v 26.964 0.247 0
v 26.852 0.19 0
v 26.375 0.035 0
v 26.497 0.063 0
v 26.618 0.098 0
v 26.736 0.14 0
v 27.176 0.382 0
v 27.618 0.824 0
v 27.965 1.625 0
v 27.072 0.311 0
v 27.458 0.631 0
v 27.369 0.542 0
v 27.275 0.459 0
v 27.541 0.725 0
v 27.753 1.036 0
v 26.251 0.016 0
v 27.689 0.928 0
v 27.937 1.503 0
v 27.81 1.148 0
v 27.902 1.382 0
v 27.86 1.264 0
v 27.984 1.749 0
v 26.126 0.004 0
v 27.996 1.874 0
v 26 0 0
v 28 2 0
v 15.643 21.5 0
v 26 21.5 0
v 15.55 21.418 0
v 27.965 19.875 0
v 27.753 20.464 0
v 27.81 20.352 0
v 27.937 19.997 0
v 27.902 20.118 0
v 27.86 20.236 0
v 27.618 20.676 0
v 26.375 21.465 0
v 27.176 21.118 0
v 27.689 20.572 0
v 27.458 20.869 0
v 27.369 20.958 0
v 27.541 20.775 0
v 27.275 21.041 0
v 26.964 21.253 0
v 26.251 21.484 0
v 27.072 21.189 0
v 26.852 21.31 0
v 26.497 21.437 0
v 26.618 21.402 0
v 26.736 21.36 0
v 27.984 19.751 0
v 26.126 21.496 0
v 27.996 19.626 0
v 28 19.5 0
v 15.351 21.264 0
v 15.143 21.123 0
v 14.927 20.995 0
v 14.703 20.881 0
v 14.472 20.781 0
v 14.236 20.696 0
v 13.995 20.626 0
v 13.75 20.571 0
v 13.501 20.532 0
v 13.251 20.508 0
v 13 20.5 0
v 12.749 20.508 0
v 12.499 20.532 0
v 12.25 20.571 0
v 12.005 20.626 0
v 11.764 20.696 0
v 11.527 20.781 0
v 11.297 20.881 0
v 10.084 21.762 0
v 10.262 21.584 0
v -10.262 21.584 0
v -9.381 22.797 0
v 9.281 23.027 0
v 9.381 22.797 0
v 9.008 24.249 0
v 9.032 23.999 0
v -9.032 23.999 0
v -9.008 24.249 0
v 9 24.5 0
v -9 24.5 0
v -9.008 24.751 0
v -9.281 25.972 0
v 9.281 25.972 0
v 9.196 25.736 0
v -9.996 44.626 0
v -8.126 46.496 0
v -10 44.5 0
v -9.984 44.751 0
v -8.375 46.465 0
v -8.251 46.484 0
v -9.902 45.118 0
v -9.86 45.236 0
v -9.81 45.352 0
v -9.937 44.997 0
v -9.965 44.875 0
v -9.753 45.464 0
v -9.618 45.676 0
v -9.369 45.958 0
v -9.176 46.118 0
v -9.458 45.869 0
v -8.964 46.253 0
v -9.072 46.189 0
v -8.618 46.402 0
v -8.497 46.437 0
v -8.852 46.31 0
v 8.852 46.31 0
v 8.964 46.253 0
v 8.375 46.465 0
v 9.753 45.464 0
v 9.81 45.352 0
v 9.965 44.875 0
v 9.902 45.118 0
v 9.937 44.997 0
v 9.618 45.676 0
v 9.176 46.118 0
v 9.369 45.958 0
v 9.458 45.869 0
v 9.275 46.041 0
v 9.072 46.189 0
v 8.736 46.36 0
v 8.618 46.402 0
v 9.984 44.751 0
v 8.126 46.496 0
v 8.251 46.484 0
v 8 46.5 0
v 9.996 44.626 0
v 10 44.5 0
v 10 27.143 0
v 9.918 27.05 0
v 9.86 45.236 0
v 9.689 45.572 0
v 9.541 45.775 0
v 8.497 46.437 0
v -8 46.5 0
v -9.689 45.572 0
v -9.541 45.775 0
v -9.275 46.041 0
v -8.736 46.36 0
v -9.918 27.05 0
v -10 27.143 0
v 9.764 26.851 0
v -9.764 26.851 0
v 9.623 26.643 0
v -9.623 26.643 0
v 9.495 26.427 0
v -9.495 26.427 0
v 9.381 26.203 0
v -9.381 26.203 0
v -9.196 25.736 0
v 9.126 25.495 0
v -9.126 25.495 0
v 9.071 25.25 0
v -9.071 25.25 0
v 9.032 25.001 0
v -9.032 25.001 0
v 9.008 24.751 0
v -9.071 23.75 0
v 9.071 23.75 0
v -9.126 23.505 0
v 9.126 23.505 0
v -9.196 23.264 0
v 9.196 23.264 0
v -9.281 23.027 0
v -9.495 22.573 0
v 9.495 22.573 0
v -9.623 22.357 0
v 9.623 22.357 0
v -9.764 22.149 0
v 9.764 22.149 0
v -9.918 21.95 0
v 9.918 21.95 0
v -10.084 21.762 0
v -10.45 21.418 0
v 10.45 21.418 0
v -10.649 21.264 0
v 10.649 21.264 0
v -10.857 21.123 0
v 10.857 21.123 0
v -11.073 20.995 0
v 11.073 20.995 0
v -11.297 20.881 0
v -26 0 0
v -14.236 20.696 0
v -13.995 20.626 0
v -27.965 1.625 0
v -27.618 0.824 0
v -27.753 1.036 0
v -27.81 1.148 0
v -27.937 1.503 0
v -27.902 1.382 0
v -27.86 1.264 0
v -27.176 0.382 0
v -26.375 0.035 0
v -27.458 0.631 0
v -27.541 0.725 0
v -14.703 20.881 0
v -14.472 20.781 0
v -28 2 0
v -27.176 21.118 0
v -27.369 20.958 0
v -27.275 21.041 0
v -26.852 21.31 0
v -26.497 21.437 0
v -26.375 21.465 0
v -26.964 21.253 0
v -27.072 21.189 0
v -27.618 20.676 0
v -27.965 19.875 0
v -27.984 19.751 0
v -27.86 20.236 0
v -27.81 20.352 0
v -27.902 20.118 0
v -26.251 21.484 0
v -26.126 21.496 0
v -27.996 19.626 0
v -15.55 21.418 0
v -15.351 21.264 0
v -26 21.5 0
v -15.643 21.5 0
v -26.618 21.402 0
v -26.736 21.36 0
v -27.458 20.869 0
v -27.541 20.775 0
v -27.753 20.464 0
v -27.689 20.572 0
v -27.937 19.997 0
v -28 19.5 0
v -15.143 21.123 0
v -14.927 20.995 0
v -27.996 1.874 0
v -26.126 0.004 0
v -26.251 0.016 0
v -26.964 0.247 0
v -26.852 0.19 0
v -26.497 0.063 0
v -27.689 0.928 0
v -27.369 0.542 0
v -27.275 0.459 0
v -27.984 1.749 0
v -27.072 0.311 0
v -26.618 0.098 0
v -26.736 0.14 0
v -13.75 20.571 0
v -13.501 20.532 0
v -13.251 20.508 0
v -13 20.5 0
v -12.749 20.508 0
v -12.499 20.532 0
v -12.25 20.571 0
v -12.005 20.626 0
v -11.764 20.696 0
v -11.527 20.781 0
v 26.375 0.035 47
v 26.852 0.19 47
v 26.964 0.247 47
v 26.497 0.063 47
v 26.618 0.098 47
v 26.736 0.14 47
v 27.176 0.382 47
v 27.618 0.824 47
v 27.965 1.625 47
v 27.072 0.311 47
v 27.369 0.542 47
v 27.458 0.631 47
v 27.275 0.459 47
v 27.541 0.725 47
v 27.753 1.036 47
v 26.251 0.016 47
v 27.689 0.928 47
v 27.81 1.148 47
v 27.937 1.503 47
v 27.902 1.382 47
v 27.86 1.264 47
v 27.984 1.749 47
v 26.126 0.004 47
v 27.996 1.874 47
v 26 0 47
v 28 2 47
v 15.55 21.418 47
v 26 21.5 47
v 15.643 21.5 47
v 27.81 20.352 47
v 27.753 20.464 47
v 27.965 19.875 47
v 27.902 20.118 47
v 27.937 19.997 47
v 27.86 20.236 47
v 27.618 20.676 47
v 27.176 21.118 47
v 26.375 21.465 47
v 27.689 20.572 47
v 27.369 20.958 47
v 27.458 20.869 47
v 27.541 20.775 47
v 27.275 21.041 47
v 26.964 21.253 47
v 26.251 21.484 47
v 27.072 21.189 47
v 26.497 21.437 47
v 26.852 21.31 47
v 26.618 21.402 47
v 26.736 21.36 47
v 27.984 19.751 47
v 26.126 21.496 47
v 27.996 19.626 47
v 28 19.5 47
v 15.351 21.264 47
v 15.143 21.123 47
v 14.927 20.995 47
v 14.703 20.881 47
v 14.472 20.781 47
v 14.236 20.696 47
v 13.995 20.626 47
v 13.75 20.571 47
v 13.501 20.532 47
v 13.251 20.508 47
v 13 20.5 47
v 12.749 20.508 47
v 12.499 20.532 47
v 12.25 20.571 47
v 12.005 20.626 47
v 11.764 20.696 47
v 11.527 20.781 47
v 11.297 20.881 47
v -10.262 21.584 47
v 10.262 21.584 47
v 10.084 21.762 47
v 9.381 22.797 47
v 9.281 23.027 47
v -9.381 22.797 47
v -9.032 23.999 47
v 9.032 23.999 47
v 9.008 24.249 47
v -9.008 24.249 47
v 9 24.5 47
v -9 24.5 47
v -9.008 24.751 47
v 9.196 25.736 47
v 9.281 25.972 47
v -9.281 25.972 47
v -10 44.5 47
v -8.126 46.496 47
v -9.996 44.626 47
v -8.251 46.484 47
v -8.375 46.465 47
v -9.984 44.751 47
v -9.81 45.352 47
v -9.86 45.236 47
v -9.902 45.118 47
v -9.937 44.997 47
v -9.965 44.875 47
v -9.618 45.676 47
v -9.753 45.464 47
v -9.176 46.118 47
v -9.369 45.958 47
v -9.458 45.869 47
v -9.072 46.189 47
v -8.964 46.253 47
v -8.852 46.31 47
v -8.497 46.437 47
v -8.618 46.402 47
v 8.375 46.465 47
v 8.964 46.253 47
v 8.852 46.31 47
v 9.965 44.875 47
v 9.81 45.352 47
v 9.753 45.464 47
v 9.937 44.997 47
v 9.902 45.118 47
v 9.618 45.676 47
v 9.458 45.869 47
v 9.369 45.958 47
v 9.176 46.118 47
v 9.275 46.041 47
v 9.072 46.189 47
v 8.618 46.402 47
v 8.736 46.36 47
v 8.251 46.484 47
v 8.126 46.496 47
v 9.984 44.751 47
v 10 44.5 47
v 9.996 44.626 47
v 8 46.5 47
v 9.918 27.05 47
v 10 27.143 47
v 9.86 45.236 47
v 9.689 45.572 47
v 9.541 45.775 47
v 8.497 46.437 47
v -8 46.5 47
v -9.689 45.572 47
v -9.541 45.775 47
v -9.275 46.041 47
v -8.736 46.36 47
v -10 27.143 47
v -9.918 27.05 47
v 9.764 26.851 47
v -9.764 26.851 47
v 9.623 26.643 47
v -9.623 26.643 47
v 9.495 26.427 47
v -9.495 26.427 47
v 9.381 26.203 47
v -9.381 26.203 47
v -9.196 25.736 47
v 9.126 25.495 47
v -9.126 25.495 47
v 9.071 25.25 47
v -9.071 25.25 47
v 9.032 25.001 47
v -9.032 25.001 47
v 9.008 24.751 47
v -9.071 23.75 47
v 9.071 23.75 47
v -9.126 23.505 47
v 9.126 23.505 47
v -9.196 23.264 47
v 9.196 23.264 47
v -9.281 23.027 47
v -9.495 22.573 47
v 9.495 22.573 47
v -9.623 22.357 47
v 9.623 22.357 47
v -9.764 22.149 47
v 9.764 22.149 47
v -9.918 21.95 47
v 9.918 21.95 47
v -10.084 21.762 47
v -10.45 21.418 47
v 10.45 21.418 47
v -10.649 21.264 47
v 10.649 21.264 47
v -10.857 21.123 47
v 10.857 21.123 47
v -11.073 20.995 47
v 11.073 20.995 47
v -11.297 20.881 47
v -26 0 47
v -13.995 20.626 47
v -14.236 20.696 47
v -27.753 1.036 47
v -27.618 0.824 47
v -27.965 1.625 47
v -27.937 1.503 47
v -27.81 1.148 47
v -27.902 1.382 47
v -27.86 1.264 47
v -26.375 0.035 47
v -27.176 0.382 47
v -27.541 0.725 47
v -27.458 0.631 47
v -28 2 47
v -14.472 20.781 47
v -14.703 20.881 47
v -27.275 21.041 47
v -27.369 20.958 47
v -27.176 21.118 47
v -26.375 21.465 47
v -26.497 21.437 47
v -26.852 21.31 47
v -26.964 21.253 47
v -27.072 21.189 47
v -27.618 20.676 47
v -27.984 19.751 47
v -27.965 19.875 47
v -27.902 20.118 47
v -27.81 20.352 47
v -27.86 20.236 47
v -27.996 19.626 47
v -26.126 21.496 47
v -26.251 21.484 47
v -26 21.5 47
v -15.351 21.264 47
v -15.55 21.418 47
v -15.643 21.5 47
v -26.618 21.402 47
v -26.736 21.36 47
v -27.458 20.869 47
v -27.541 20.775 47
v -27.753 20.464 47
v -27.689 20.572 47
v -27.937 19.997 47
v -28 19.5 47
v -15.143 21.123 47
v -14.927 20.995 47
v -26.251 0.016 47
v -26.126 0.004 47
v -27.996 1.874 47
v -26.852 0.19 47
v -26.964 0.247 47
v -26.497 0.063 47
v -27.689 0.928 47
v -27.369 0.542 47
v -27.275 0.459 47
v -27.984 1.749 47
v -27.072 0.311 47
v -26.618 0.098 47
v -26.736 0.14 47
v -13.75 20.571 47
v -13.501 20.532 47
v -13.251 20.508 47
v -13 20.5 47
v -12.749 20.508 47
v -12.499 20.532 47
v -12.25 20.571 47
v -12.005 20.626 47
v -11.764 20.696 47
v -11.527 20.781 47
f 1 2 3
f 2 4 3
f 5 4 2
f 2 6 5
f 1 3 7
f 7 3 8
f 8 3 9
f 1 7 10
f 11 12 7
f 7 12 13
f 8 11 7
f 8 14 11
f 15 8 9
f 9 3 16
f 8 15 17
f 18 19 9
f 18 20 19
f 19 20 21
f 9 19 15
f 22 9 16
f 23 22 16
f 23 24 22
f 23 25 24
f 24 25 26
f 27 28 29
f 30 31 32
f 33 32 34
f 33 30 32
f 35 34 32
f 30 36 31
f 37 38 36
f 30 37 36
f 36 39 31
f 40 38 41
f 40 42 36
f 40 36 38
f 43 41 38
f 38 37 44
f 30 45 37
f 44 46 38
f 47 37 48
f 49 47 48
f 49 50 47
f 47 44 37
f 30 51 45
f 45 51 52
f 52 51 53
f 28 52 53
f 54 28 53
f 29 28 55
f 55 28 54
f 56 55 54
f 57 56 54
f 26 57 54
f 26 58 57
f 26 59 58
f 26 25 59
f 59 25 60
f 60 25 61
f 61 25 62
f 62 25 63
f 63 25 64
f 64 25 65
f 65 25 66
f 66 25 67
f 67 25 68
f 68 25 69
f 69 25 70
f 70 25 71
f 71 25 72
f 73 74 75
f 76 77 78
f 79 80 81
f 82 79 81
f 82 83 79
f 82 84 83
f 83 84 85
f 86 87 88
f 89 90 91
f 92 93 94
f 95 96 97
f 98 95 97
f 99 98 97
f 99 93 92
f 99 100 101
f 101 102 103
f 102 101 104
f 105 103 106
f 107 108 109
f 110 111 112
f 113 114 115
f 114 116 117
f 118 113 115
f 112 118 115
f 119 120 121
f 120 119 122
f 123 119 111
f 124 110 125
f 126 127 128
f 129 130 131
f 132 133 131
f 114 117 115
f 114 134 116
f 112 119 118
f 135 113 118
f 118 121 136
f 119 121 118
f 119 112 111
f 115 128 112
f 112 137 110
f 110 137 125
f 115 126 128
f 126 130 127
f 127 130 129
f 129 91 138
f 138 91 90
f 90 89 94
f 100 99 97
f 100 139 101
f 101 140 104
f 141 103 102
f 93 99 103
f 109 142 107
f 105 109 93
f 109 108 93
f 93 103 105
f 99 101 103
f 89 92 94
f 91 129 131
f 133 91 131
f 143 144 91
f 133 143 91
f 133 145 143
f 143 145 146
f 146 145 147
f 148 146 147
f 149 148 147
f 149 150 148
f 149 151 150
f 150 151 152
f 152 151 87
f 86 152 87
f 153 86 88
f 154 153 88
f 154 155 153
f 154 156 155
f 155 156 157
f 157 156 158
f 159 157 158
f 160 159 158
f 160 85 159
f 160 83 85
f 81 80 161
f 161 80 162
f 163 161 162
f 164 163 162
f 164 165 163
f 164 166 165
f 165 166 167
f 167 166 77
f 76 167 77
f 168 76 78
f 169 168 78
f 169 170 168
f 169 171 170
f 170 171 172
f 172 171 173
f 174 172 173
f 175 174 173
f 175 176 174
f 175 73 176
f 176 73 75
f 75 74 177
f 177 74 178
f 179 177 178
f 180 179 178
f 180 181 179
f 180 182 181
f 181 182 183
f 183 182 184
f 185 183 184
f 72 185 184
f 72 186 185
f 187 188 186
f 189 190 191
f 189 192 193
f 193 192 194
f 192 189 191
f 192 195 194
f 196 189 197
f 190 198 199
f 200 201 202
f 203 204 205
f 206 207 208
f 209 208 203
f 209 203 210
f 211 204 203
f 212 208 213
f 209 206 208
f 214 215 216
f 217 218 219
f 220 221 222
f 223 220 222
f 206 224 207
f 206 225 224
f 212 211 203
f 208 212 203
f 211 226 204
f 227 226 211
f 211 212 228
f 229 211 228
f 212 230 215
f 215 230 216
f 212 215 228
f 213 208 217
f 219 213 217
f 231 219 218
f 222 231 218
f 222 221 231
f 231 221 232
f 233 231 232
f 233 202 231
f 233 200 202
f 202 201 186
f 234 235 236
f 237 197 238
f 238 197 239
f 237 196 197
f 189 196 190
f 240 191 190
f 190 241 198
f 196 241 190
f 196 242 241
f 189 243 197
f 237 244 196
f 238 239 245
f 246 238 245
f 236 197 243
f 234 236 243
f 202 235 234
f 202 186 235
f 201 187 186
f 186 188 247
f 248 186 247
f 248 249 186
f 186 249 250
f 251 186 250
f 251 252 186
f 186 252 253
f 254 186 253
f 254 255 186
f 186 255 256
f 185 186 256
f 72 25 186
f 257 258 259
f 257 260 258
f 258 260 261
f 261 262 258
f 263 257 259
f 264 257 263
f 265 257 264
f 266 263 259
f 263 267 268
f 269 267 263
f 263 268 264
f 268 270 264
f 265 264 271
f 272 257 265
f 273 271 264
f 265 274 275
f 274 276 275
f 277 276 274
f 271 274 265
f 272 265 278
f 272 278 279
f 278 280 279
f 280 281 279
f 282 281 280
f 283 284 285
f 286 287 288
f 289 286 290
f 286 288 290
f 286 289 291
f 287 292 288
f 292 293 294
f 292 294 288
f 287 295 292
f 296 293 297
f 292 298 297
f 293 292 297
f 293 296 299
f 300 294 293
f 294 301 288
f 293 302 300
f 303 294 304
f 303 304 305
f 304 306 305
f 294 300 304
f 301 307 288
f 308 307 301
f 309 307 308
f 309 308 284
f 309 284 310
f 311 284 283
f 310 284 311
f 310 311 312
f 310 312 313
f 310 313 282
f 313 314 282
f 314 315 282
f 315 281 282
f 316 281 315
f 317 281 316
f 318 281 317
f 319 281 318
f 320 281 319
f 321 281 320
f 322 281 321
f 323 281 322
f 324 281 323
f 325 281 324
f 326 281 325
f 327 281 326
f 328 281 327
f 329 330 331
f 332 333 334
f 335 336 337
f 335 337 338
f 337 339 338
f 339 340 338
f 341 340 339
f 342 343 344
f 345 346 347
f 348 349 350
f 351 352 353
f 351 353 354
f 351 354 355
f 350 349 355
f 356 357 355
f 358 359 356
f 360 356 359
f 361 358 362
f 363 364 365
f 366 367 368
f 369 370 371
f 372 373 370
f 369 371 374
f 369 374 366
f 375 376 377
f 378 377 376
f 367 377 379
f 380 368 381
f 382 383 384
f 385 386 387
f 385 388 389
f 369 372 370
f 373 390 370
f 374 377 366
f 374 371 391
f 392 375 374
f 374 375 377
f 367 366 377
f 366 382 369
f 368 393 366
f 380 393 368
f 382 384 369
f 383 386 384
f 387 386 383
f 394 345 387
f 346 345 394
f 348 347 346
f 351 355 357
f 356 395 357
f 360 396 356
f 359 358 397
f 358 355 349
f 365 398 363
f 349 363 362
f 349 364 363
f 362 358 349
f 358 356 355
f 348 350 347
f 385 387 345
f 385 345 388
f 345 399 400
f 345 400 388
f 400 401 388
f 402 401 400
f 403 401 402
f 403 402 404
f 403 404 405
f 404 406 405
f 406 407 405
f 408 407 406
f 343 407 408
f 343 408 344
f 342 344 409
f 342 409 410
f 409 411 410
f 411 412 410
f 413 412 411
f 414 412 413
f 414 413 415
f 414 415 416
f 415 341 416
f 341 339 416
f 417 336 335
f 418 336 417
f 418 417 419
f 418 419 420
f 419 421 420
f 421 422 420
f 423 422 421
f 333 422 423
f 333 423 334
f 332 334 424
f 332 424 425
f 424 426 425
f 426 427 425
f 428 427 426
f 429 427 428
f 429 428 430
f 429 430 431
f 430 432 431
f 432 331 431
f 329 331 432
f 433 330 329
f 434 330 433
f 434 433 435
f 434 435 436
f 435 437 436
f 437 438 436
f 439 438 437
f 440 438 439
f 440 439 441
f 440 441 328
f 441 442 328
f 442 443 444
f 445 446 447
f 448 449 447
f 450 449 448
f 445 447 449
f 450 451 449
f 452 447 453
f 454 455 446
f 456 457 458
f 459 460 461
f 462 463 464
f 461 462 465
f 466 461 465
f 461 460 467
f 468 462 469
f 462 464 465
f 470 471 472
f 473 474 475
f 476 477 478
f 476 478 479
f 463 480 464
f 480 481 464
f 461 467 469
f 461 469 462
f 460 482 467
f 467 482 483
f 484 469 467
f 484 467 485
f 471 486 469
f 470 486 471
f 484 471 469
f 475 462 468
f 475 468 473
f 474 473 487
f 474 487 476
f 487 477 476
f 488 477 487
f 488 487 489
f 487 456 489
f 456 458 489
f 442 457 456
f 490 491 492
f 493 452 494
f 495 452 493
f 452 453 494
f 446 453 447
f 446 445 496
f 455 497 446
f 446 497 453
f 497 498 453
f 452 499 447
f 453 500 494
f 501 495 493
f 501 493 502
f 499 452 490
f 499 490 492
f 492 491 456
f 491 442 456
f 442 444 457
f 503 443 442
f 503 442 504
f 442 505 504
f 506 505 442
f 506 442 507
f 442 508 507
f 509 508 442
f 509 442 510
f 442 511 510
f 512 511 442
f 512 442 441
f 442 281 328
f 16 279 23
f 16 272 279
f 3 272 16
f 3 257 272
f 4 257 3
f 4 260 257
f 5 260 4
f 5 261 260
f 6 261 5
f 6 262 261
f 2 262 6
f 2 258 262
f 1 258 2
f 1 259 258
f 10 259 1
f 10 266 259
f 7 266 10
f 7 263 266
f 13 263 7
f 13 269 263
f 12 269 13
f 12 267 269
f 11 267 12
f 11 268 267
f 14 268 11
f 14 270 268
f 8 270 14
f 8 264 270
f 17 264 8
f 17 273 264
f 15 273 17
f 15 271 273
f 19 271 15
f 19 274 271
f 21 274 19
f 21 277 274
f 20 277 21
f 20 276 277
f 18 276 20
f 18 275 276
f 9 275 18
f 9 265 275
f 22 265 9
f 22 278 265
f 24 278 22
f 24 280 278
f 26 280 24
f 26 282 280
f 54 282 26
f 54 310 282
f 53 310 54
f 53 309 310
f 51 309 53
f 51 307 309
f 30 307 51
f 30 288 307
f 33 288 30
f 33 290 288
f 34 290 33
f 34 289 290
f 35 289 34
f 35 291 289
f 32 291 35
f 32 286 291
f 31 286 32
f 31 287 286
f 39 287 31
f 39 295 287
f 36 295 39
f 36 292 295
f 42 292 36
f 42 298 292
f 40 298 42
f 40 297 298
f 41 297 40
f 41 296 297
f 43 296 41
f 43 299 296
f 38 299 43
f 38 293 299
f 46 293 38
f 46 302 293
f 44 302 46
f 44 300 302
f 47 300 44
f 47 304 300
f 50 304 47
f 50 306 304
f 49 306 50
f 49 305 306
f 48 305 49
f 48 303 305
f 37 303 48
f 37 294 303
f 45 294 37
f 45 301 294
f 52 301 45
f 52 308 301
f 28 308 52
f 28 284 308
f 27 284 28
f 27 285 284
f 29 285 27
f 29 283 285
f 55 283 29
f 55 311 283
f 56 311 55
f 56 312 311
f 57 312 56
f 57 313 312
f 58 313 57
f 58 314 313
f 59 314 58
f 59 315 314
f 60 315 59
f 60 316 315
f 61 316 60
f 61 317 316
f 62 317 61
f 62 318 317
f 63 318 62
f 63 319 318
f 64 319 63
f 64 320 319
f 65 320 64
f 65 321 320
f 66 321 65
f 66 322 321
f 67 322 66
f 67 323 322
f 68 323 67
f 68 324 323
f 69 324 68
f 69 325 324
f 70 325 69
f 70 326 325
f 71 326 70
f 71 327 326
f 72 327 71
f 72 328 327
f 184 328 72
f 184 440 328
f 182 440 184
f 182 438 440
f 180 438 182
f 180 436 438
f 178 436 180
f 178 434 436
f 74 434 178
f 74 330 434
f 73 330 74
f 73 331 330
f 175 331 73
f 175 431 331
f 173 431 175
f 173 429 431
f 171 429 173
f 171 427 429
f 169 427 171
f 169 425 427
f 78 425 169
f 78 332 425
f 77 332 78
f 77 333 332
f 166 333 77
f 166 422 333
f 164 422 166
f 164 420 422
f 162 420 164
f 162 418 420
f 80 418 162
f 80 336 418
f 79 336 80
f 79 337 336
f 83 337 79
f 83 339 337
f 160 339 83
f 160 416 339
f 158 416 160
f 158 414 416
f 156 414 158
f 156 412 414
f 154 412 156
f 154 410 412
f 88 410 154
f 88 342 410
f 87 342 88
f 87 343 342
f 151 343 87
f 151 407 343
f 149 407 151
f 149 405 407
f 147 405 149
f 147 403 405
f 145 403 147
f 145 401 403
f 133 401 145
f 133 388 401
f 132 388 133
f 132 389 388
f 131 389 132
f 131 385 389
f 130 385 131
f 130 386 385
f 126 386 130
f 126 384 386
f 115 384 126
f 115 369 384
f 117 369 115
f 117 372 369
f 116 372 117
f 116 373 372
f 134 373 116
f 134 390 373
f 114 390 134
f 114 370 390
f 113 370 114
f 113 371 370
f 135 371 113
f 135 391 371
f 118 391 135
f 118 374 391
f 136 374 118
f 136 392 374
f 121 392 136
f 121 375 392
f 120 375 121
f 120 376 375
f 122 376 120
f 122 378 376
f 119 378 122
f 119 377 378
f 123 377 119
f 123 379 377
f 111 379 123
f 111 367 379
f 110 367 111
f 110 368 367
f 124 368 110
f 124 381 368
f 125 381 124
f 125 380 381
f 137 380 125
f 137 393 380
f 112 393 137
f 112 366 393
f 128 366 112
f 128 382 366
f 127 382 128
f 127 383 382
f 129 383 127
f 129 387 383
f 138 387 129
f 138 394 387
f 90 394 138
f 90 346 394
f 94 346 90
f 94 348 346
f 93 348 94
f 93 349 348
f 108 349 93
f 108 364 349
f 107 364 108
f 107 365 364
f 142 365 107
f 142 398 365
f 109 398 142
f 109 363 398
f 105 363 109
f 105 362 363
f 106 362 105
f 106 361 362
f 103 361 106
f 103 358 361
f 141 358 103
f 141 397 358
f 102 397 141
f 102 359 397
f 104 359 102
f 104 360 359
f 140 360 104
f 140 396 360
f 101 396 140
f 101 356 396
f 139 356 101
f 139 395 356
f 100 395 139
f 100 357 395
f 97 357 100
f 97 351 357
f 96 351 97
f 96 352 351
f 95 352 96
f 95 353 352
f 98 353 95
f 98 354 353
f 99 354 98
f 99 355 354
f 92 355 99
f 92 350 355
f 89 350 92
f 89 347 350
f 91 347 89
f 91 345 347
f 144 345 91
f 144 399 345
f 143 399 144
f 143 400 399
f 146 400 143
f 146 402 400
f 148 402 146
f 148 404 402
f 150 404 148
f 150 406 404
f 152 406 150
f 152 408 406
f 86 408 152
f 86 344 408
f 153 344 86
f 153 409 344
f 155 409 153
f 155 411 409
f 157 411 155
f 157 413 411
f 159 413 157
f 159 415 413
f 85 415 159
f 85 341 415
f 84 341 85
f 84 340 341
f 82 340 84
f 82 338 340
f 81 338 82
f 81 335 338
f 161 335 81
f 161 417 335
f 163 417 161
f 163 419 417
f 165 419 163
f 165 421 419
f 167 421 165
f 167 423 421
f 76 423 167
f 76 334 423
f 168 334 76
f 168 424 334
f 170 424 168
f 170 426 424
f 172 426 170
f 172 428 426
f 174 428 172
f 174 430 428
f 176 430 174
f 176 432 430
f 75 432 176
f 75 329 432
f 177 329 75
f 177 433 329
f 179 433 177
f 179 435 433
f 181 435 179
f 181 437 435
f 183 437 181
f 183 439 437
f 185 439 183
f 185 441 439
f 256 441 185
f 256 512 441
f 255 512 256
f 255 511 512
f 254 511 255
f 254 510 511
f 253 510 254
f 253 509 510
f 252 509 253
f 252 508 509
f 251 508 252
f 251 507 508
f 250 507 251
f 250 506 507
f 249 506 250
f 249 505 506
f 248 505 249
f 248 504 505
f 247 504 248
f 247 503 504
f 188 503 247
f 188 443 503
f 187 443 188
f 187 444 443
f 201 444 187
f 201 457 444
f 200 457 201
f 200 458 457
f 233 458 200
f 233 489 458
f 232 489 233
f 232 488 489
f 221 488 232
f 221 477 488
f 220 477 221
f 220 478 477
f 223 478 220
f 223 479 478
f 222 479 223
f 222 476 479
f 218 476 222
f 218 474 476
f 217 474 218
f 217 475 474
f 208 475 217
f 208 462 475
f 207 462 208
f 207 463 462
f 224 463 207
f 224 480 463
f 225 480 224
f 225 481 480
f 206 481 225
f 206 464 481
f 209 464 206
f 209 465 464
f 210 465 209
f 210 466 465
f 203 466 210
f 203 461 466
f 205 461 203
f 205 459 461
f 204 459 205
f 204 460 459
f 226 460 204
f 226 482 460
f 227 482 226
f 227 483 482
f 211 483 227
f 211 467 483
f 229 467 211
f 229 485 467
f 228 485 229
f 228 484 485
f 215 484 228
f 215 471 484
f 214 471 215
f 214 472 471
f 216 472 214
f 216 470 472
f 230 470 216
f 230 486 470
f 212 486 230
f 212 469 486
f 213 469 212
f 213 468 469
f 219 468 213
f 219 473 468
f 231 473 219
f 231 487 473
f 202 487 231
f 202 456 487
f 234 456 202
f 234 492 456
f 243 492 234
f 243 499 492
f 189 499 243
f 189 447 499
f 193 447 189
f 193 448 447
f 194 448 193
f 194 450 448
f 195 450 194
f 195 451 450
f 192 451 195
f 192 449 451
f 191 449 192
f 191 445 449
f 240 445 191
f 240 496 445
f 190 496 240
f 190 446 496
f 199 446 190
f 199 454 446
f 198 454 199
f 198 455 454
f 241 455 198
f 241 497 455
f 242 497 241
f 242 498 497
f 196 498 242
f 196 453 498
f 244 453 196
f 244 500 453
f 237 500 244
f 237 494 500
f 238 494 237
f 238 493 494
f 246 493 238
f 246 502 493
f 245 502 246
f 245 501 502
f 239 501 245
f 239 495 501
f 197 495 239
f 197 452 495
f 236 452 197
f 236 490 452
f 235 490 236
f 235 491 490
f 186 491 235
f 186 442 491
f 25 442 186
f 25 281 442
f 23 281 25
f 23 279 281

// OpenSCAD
include <../shared/common.scad>

$fn = 100;

// ----------------------------------------------------------------------------
// MEASUREMENTS

/* [Measurements] */

// slatted frame z-height
frame_z = 47;   // [10:80]
// gap between frames along x axis (left <-> right)
gap_x = 20;     // [1:0.05:80]
// gap between frames along y axis (head <-> toe)
gap_y = 21.5;   // [1:0.05:80]


// ----------------------------------------------------------------------------
// PARAMETERS

/* [Parameters] */

// length of wings extending along the x axis
wing_x = 18;    // [5:40]
// length of the wing extending along the y axis
wing_y = 25;    // [5:80]
// radius for cutout at inside right angles
cutout_r = 4;   // [0:0.1:10]
// outward shifting distance of the right angle cutout position
cutout_shift = 3;   // [0:0.1:10]
// outer rounding radius
round_outer_r = 2;  // [0:0.1:5]


// ----------------------------------------------------------------------------
// DERIVED PARAMETERS

module __Customizer_Limit__ () {}


// ----------------------------------------------------------------------------
// PARTS

module shape_2d() {
    difference() {
        round_chamfer(r=round_outer_r, keep_size=true) {
            mirror_copy([1, 0, 0]) {
                square([gap_x/2 + wing_x, gap_y]);
                square([gap_x/2, gap_y + wing_y]);
            }
        }
        mirror_copy([1, 0, 0]) {
            translate([gap_x/2, gap_y] + cutout_shift * [1, 1]) {
                circle(r=cutout_r);
            }
        }
    }
}

module shape_3d() {
    linear_extrude(frame_z) {
        shape_2d();
    }
}

shape_3d();
